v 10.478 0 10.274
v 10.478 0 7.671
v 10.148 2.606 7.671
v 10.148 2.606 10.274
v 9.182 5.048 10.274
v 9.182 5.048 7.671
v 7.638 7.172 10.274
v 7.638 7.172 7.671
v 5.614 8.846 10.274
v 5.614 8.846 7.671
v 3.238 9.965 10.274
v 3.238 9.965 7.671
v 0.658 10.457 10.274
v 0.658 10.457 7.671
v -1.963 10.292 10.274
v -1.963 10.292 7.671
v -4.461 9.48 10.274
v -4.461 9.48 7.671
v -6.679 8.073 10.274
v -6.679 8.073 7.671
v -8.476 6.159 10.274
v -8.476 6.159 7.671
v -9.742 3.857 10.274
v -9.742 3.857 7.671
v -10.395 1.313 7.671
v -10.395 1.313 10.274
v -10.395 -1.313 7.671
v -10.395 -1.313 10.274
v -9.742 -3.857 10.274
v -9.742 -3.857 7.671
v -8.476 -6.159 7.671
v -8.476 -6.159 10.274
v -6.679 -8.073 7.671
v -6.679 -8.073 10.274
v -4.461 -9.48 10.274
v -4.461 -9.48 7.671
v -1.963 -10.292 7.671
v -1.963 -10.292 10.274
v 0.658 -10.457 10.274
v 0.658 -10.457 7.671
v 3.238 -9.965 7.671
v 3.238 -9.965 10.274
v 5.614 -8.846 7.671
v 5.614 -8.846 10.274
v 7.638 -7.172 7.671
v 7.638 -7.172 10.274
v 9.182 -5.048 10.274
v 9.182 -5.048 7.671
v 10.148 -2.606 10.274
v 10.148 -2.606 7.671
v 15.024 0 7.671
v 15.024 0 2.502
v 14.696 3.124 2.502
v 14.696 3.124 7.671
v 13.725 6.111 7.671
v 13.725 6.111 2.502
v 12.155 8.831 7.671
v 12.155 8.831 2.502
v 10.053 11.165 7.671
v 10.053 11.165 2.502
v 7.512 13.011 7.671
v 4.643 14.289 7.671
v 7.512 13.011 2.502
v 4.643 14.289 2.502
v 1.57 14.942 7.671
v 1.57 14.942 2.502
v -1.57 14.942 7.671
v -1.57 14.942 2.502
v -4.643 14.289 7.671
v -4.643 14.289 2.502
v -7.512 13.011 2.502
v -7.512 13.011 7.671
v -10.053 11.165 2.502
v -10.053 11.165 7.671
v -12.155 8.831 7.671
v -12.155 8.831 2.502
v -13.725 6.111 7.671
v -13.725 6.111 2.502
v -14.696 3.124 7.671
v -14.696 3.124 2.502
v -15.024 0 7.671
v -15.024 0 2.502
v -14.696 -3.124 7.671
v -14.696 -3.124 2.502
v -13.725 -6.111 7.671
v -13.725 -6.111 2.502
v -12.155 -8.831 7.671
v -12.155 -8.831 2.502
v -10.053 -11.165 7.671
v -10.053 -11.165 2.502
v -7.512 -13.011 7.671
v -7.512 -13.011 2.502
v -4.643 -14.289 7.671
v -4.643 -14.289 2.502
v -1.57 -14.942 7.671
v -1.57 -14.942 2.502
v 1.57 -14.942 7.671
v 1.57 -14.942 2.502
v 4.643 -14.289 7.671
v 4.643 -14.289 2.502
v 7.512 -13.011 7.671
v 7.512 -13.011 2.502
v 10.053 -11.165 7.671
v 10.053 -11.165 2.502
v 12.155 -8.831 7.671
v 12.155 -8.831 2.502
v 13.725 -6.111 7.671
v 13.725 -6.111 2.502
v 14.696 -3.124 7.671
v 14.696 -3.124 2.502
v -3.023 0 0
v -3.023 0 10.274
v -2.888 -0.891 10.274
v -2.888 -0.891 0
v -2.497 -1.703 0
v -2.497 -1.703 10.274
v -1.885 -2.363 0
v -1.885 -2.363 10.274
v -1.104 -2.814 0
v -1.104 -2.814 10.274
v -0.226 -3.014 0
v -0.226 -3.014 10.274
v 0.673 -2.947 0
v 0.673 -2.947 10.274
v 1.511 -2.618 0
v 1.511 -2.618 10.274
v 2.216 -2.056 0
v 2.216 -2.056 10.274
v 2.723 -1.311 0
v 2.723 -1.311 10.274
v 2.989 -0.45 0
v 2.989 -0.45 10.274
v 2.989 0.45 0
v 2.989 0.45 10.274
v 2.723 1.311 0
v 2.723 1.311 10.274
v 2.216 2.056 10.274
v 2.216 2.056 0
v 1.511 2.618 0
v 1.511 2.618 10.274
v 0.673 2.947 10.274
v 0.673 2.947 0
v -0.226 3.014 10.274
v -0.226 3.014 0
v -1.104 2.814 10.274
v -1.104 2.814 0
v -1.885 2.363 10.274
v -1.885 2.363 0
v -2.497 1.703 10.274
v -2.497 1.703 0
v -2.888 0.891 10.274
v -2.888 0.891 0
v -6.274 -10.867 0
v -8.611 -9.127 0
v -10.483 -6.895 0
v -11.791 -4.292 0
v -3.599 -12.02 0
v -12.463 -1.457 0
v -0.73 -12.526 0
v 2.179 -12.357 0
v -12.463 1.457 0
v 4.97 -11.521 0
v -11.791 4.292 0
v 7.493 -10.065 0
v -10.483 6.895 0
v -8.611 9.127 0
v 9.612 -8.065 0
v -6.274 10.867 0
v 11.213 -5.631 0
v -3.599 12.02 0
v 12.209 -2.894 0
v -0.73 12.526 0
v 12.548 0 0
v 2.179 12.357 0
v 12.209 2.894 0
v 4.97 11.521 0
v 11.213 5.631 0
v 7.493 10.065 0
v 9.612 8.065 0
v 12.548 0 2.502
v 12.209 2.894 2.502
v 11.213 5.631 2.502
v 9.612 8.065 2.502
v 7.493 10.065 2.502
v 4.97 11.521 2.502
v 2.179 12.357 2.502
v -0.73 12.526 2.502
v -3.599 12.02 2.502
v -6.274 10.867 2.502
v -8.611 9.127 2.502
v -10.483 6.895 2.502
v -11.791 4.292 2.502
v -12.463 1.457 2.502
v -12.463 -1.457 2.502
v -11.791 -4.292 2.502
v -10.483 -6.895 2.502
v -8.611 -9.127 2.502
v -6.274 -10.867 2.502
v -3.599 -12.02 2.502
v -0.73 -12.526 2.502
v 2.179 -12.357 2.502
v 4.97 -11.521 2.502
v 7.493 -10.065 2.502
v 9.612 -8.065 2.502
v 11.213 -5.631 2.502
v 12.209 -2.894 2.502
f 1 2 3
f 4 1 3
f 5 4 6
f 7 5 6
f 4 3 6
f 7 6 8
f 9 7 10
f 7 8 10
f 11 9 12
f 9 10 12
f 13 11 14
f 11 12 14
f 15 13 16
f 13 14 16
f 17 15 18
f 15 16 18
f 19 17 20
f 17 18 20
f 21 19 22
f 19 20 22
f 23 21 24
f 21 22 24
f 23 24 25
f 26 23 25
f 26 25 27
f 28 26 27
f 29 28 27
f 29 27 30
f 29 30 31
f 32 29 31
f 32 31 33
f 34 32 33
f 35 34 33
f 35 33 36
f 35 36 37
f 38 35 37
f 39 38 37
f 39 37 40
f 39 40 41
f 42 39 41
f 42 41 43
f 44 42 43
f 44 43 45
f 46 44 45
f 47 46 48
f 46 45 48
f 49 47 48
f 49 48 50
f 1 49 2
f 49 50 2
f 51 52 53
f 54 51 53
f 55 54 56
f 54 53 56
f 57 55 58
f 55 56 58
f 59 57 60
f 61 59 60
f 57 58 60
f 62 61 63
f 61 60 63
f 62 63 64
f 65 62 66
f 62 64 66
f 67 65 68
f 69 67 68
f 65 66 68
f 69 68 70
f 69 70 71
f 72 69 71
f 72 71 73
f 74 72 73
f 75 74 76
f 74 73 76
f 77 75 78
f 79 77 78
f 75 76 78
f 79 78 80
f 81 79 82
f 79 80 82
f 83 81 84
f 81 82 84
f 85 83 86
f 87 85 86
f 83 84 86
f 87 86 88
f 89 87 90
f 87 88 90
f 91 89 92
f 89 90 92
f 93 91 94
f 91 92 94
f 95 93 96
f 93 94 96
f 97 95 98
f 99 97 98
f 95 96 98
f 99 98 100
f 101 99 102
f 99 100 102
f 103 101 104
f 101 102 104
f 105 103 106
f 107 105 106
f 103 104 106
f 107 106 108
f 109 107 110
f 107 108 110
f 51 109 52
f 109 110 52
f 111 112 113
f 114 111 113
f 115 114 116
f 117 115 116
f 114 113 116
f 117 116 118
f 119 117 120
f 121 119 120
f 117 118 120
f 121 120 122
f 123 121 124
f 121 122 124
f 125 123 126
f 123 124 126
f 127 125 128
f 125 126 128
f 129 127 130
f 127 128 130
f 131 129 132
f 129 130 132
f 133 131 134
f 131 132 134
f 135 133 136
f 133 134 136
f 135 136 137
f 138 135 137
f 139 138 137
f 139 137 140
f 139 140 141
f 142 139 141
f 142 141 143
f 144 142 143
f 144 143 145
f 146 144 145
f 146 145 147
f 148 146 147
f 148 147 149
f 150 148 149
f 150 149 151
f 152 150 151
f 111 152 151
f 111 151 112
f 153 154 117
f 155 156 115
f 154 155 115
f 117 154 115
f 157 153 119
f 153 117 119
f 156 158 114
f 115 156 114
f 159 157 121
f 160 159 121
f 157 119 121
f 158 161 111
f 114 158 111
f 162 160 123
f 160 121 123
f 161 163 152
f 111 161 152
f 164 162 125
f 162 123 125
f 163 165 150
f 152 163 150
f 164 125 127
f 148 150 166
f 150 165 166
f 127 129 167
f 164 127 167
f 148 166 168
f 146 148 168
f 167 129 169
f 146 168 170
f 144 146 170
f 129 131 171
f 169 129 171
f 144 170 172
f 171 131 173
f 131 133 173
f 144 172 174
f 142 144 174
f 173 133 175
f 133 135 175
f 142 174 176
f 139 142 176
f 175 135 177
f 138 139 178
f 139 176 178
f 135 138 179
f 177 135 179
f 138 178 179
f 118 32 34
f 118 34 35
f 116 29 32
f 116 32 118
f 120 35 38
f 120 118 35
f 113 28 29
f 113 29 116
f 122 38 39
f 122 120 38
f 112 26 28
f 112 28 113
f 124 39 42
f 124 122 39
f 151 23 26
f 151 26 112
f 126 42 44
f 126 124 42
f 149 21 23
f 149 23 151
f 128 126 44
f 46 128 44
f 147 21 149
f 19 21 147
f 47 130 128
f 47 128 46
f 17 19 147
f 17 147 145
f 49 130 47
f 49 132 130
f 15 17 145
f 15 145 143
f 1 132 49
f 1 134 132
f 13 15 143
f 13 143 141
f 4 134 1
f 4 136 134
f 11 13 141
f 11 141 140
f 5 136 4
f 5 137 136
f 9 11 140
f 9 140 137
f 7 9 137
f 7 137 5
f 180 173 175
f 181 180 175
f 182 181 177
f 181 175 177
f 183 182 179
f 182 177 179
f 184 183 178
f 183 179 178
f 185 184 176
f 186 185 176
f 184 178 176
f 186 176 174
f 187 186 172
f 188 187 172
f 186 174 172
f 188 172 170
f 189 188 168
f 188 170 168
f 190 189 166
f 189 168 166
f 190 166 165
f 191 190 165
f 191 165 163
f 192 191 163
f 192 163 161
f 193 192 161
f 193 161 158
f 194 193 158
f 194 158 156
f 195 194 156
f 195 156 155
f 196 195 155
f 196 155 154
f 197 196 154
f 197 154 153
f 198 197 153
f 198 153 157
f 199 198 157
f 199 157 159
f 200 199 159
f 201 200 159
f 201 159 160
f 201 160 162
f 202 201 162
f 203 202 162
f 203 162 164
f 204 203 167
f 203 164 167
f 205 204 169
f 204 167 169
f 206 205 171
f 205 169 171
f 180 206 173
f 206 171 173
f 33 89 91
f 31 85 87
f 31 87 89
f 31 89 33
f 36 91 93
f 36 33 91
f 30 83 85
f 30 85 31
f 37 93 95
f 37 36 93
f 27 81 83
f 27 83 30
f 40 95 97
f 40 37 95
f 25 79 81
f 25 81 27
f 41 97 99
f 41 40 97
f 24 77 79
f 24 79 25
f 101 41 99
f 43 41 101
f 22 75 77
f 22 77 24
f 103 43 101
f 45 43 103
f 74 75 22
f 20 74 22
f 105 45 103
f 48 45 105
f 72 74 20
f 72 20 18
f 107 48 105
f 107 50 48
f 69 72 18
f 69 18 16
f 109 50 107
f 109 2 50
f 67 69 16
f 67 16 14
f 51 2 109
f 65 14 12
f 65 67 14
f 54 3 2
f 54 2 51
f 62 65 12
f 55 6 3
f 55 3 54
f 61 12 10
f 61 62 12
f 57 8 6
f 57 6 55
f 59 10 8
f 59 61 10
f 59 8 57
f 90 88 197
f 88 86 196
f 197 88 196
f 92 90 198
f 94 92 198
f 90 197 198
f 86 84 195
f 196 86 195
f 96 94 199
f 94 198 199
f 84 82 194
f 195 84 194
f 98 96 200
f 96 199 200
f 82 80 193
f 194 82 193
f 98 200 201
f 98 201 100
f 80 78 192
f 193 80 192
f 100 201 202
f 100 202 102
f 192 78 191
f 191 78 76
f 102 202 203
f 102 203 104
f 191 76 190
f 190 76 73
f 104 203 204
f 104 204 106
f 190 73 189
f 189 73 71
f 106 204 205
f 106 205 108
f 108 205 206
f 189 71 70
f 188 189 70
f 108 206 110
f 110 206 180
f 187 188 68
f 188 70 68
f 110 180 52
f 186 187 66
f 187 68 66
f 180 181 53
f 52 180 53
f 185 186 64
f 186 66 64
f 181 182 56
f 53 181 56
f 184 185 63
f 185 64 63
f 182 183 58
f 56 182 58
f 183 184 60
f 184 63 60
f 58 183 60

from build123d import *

# Parameters (mm, degrees)
F0_R     = 10.4775
F1_DEPTH = 10.2743
F0_R_2   = 12.5476
F2_DEPTH = 7.6708
F3_START = 2.5019
F0_R_3   = 15.0241
F3_DEPTH = 5.1689
F4_D     = 6.0452


# Not quite as in the source:
# - a feature names something its author has since deleted; it is built from what else it names


with BuildPart() as f1:
    # F0 (on Top) → F1 (new body)
    with BuildSketch(Plane.XY):
        Circle(F0_R)
    extrude(amount=F1_DEPTH)

    # F0 (on Top) → F2 (join)
    with BuildSketch(Plane.XY):
        Circle(F0_R_2)
        Circle(F0_R, mode=Mode.SUBTRACT)
    extrude(amount=F2_DEPTH)

    # F0 (on Top) → F3 (join)
    with BuildSketch(Plane.XY.offset(F3_START)):
        Circle(F0_R_3)
        Circle(F0_R_2, mode=Mode.SUBTRACT)
    extrude(amount=F3_DEPTH)

    # F4 (through all)
    with Locations(Plane(origin=(0, 0, 0), x_dir=(1, 0, 0), z_dir=(0, 0, -1))):
        with Locations((0, 0)):
            Hole(F4_D / 2)


solid = f1.part
